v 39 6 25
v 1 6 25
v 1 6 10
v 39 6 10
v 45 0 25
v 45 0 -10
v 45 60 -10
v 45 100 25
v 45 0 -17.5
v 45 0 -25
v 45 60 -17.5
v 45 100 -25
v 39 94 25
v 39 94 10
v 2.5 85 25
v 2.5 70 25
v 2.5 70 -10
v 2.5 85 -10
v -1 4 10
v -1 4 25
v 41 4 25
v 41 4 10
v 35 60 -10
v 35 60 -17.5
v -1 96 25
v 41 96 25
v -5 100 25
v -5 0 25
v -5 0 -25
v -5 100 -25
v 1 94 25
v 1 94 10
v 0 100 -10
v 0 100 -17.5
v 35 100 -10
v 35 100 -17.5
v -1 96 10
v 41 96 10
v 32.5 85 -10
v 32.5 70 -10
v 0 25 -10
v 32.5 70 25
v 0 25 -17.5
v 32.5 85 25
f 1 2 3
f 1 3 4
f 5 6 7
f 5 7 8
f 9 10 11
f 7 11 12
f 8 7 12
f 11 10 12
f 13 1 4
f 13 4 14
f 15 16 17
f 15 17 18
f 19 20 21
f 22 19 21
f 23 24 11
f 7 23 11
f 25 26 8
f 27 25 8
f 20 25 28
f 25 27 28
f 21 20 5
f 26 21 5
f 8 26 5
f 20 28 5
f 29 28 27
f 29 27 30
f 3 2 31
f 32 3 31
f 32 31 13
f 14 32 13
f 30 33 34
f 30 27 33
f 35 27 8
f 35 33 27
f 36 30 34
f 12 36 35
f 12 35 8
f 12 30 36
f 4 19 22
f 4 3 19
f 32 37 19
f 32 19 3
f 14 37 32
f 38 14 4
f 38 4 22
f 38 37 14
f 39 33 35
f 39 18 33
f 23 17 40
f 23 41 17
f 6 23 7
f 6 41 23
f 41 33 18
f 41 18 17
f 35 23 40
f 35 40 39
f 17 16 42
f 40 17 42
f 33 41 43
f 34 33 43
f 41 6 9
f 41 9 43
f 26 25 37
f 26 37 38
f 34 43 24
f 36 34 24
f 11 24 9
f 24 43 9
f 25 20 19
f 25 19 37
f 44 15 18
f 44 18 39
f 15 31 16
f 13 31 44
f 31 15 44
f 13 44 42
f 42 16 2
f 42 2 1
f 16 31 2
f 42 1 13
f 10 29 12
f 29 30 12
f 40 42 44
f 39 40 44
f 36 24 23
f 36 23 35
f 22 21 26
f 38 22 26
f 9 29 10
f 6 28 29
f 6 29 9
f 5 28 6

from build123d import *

# Parameters (mm, degrees)
BOSS_EXTRUDE1_DEPTH = 25
SKETCH2_W           = 50
SKETCH2_H           = 35
SKETCH2_H_2         = 7.5
BOSS_EXTRUDE2_DEPTH = 100
SKETCH3_W           = 5
SKETCH3_H           = 7.5
BOSS_EXTRUDE3_DEPTH = 75
SKETCH4_W           = 10
SKETCH4_H           = 40
BOSS_EXTRUDE4_DEPTH = 7.5
CUT_EXTRUDE1_REACH  = 122.52
SKETCH5_W           = 30
SKETCH5_H           = 15
SKETCH7_W           = 42
SKETCH7_H           = 92
SKETCH7_W_2         = 38
SKETCH7_H_2         = 88
CUT_EXTRUDE2_DEPTH  = 15


with BuildPart() as part:
    # Sketch1 → Boss-Extrude1 (new, symmetric)
    with BuildSketch(Plane.XY):
        Polygon((0, 0), (45, 0), (0, 25), (-5, 25), (-5, 0), align=None)
    extrude(amount=BOSS_EXTRUDE1_DEPTH, both=True)

    # Sketch2 → Boss-Extrude2 (add)
    with BuildSketch(Plane(origin=(0, 0, 0), x_dir=(1, 0, 0), z_dir=(0, 1, 0))):
        with Locations((20, -7.5)):
            Rectangle(SKETCH2_W, SKETCH2_H)
        with Locations((20, 21.25)):
            Rectangle(SKETCH2_W, SKETCH2_H_2)
    extrude(amount=BOSS_EXTRUDE2_DEPTH)

    # Sketch3 → Boss-Extrude3 (add)
    with BuildSketch(Plane(origin=(0, 25, 0), x_dir=(1, 0, 0), z_dir=(0, 1, 0))):
        with Locations((-2.5, 13.75)):
            Rectangle(SKETCH3_W, SKETCH3_H)
    extrude(amount=BOSS_EXTRUDE3_DEPTH)

    # Sketch4 → Boss-Extrude4 (add)
    with BuildSketch(Plane.XY.offset(-17.5)):
        with Locations((40, 80)):
            Rectangle(SKETCH4_W, SKETCH4_H)
    extrude(amount=BOSS_EXTRUDE4_DEPTH)

    # Sketch5 → Cut-Extrude1 (cut, up to next)
    with BuildSketch(Plane.XY.offset(25), mode=Mode.PRIVATE) as cut_extrude1_sk1:
        with Locations((17.5, 77.5)):
            Rectangle(SKETCH5_W, SKETCH5_H)
    cut_extrude1_tool1 = extrude(cut_extrude1_sk1.sketch, amount=-CUT_EXTRUDE1_REACH, mode=Mode.PRIVATE) & part.part
    add(cut_extrude1_tool1.solids().sort_by_distance((17.5, 77.5, 25))[0], mode=Mode.SUBTRACT)

    # Sketch7 → Cut-Extrude2 (cut)
    with BuildSketch(Plane.XY.offset(25)):
        with Locations((20, 50)):
            Rectangle(SKETCH7_W, SKETCH7_H)
        with Locations((20, 50)):
            Rectangle(SKETCH7_W_2, SKETCH7_H_2, mode=Mode.SUBTRACT)
    extrude(amount=-CUT_EXTRUDE2_DEPTH, mode=Mode.SUBTRACT)


solid = part.part
